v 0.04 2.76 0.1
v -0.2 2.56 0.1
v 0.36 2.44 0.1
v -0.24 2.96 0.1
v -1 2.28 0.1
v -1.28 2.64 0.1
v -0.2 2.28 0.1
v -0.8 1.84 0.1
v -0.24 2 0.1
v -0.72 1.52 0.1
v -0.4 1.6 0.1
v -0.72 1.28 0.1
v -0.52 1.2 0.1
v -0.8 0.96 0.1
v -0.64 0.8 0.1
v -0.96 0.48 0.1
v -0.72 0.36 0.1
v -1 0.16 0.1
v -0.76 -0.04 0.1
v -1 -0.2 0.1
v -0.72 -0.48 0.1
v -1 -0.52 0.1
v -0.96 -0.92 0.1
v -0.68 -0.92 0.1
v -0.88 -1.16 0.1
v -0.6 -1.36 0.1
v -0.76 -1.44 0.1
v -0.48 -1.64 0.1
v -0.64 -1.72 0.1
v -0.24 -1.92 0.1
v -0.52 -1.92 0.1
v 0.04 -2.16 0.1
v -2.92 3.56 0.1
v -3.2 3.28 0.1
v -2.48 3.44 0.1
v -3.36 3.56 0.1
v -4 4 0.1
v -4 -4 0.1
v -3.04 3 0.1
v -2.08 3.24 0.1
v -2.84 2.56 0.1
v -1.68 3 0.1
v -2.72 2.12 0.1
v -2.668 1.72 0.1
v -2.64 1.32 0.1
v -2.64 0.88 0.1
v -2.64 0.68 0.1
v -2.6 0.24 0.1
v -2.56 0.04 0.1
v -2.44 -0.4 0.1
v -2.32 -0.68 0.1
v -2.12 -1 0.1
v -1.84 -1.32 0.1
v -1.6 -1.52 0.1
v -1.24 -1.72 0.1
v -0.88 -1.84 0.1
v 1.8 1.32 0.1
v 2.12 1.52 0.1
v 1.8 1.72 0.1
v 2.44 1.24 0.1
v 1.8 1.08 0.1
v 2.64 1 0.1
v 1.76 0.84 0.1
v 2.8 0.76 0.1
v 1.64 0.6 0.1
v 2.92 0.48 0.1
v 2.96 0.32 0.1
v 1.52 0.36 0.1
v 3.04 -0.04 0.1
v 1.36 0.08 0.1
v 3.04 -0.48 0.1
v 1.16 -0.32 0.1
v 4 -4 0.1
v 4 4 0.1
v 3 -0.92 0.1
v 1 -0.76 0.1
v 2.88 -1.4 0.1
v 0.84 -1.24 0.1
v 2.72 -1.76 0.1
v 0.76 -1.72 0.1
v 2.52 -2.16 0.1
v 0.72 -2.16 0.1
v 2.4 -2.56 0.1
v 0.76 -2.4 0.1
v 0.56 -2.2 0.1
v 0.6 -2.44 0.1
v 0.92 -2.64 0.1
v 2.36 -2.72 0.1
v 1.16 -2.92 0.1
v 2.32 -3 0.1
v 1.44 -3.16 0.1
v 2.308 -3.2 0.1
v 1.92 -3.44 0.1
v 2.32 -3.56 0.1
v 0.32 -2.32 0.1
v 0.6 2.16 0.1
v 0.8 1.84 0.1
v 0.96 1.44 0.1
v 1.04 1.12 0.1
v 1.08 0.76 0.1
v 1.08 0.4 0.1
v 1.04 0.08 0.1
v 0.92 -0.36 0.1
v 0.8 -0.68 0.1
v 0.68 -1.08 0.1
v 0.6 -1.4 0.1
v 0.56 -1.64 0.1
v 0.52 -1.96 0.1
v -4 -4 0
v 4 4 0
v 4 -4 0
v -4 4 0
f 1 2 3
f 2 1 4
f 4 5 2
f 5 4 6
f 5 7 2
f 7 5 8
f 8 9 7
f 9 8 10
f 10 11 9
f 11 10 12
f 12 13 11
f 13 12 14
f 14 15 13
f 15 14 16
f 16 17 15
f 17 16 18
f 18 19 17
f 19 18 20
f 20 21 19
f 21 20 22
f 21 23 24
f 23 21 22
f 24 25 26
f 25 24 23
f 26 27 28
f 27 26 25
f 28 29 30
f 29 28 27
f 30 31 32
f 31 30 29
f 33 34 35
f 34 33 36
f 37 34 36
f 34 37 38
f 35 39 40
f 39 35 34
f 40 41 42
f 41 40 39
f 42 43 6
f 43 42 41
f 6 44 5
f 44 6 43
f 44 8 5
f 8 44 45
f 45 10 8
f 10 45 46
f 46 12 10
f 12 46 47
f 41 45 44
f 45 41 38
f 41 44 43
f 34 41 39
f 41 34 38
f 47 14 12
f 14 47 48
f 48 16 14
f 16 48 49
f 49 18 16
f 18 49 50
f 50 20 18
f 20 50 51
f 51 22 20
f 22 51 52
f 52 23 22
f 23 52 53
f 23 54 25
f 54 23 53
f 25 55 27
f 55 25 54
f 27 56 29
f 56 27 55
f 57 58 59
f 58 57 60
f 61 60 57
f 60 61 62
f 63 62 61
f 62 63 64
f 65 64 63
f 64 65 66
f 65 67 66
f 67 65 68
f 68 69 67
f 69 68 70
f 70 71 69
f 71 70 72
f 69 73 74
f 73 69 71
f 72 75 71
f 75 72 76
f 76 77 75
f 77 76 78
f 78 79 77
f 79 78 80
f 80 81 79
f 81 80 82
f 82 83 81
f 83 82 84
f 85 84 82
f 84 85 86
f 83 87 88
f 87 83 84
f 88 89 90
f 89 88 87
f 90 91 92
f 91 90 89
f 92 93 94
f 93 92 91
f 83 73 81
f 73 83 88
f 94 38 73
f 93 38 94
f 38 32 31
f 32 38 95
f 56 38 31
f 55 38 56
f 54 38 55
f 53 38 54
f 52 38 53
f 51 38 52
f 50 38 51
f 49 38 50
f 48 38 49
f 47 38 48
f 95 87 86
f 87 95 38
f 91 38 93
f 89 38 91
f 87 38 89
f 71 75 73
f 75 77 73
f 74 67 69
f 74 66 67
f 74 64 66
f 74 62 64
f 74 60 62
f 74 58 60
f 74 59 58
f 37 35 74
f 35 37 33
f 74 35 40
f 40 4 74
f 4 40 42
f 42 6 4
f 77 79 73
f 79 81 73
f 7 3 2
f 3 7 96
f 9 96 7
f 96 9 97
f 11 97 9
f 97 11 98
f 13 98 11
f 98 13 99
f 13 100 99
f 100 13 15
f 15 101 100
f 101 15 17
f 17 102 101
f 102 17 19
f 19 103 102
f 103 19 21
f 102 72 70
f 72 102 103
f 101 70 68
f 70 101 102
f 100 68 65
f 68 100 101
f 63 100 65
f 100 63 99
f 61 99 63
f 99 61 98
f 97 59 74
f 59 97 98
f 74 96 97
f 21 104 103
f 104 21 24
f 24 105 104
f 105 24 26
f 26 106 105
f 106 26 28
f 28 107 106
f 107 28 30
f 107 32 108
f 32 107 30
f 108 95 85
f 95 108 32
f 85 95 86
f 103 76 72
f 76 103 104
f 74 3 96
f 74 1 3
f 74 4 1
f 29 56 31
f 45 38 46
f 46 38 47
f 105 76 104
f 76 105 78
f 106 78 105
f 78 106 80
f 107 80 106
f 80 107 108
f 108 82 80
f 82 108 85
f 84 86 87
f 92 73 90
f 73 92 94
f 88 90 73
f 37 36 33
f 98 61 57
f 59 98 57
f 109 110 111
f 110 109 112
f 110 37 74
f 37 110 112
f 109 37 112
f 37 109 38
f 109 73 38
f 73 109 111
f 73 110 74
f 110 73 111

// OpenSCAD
// file: ../p/box5-12.scad
use <../lib.scad>
function ldraw_lib__box5_12() = [
// 0 Box with 5 Faces without Any Edges
// 0 Name: box5-12.dat
// 0 Author: Chris Dee [cwdee]
// 0 !LDRAW_ORG Primitive UPDATE 2009-02
// 0 !LICENSE Licensed under CC BY 4.0 : see CAreadme.txt
// 
// 0 BFC CERTIFY CCW
  [0,"BFC","CERTIFY"],
  [0,"BFC","CCW"],
// 
// 0 !HISTORY 2009-09-03 [PTadmin] Official Update 2009-02
// 
// 
// 4 16 1 1 1 1 1 -1 -1 1 -1 -1 1 1
  [4,16,1,1,1,1,1,-1,-1,1,-1,-1,1,1],
// 4 16 -1 0 1 1 0 1 1 1 1 -1 1 1
  [4,16,-1,0,1,1,0,1,1,1,1,-1,1,1],
// 4 16 -1 0 -1 -1 0 1 -1 1 1 -1 1 -1
  [4,16,-1,0,-1,-1,0,1,-1,1,1,-1,1,-1],
// 4 16 1 0 -1 -1 0 -1 -1 1 -1 1 1 -1
  [4,16,1,0,-1,-1,0,-1,-1,1,-1,1,1,-1],
// 4 16 1 0 1 1 0 -1 1 1 -1 1 1 1
  [4,16,1,0,1,1,0,-1,1,1,-1,1,1,1],
// 0
];
module ldraw_lib__box5_12(step=0, col=false, unit=2/5, alt=false, line=0.2, solid=!$preview)
    makepoly(ldraw_lib__box5_12(), step=step, col=col, unit=unit, alt=alt, line=line, solid=solid);
ldraw_lib__box5_12(line=0.2);
// main file
use <../lib.scad>
use <../p/box5-12.scad>
use <s/004659as01.scad>
function ldraw_lib__004659a() = [
// 0 Sticker  1 x  1 Fire Emblem
// 0 Name: 004659a.dat
// 0 Author: Alex Taylor [anathema]
// 0 !LDRAW_ORG Part UPDATE 2013-01
// 0 !LICENSE Licensed under CC BY 4.0 : see CAreadme.txt
// 
// 0 BFC CERTIFY CCW
  [0,"BFC","CERTIFY"],
  [0,"BFC","CCW"],
// 
// 0 !HISTORY 2013-03-17 [MagFors] Used box primitive
// 0 !HISTORY 2013-07-21 [PTadmin] Official Update 2013-01
// 
// 
// 1 16 0 -0.25 0 1 0 0 0 1 0 0 0 1 s\004659as01.dat
  [1,16,0,-0.25,0,1,0,0,0,1,0,0,0,1, ldraw_lib__s__004659as01()],
// 1 16 0 -0.25 0 10 0 0 0 0.25 0 0 0 10 box5-12.dat
  [1,16,0,-0.25,0,10,0,0,0,0.25,0,0,0,10, ldraw_lib__box5_12()],
];
module ldraw_lib__004659a(step=0, col=false, unit=2/5, alt=false, line=0.2, solid=!$preview)
    makepoly(ldraw_lib__004659a(), step=step, col=col, unit=unit, alt=alt, line=line, solid=solid);
ldraw_lib__004659a(line=0.2);
